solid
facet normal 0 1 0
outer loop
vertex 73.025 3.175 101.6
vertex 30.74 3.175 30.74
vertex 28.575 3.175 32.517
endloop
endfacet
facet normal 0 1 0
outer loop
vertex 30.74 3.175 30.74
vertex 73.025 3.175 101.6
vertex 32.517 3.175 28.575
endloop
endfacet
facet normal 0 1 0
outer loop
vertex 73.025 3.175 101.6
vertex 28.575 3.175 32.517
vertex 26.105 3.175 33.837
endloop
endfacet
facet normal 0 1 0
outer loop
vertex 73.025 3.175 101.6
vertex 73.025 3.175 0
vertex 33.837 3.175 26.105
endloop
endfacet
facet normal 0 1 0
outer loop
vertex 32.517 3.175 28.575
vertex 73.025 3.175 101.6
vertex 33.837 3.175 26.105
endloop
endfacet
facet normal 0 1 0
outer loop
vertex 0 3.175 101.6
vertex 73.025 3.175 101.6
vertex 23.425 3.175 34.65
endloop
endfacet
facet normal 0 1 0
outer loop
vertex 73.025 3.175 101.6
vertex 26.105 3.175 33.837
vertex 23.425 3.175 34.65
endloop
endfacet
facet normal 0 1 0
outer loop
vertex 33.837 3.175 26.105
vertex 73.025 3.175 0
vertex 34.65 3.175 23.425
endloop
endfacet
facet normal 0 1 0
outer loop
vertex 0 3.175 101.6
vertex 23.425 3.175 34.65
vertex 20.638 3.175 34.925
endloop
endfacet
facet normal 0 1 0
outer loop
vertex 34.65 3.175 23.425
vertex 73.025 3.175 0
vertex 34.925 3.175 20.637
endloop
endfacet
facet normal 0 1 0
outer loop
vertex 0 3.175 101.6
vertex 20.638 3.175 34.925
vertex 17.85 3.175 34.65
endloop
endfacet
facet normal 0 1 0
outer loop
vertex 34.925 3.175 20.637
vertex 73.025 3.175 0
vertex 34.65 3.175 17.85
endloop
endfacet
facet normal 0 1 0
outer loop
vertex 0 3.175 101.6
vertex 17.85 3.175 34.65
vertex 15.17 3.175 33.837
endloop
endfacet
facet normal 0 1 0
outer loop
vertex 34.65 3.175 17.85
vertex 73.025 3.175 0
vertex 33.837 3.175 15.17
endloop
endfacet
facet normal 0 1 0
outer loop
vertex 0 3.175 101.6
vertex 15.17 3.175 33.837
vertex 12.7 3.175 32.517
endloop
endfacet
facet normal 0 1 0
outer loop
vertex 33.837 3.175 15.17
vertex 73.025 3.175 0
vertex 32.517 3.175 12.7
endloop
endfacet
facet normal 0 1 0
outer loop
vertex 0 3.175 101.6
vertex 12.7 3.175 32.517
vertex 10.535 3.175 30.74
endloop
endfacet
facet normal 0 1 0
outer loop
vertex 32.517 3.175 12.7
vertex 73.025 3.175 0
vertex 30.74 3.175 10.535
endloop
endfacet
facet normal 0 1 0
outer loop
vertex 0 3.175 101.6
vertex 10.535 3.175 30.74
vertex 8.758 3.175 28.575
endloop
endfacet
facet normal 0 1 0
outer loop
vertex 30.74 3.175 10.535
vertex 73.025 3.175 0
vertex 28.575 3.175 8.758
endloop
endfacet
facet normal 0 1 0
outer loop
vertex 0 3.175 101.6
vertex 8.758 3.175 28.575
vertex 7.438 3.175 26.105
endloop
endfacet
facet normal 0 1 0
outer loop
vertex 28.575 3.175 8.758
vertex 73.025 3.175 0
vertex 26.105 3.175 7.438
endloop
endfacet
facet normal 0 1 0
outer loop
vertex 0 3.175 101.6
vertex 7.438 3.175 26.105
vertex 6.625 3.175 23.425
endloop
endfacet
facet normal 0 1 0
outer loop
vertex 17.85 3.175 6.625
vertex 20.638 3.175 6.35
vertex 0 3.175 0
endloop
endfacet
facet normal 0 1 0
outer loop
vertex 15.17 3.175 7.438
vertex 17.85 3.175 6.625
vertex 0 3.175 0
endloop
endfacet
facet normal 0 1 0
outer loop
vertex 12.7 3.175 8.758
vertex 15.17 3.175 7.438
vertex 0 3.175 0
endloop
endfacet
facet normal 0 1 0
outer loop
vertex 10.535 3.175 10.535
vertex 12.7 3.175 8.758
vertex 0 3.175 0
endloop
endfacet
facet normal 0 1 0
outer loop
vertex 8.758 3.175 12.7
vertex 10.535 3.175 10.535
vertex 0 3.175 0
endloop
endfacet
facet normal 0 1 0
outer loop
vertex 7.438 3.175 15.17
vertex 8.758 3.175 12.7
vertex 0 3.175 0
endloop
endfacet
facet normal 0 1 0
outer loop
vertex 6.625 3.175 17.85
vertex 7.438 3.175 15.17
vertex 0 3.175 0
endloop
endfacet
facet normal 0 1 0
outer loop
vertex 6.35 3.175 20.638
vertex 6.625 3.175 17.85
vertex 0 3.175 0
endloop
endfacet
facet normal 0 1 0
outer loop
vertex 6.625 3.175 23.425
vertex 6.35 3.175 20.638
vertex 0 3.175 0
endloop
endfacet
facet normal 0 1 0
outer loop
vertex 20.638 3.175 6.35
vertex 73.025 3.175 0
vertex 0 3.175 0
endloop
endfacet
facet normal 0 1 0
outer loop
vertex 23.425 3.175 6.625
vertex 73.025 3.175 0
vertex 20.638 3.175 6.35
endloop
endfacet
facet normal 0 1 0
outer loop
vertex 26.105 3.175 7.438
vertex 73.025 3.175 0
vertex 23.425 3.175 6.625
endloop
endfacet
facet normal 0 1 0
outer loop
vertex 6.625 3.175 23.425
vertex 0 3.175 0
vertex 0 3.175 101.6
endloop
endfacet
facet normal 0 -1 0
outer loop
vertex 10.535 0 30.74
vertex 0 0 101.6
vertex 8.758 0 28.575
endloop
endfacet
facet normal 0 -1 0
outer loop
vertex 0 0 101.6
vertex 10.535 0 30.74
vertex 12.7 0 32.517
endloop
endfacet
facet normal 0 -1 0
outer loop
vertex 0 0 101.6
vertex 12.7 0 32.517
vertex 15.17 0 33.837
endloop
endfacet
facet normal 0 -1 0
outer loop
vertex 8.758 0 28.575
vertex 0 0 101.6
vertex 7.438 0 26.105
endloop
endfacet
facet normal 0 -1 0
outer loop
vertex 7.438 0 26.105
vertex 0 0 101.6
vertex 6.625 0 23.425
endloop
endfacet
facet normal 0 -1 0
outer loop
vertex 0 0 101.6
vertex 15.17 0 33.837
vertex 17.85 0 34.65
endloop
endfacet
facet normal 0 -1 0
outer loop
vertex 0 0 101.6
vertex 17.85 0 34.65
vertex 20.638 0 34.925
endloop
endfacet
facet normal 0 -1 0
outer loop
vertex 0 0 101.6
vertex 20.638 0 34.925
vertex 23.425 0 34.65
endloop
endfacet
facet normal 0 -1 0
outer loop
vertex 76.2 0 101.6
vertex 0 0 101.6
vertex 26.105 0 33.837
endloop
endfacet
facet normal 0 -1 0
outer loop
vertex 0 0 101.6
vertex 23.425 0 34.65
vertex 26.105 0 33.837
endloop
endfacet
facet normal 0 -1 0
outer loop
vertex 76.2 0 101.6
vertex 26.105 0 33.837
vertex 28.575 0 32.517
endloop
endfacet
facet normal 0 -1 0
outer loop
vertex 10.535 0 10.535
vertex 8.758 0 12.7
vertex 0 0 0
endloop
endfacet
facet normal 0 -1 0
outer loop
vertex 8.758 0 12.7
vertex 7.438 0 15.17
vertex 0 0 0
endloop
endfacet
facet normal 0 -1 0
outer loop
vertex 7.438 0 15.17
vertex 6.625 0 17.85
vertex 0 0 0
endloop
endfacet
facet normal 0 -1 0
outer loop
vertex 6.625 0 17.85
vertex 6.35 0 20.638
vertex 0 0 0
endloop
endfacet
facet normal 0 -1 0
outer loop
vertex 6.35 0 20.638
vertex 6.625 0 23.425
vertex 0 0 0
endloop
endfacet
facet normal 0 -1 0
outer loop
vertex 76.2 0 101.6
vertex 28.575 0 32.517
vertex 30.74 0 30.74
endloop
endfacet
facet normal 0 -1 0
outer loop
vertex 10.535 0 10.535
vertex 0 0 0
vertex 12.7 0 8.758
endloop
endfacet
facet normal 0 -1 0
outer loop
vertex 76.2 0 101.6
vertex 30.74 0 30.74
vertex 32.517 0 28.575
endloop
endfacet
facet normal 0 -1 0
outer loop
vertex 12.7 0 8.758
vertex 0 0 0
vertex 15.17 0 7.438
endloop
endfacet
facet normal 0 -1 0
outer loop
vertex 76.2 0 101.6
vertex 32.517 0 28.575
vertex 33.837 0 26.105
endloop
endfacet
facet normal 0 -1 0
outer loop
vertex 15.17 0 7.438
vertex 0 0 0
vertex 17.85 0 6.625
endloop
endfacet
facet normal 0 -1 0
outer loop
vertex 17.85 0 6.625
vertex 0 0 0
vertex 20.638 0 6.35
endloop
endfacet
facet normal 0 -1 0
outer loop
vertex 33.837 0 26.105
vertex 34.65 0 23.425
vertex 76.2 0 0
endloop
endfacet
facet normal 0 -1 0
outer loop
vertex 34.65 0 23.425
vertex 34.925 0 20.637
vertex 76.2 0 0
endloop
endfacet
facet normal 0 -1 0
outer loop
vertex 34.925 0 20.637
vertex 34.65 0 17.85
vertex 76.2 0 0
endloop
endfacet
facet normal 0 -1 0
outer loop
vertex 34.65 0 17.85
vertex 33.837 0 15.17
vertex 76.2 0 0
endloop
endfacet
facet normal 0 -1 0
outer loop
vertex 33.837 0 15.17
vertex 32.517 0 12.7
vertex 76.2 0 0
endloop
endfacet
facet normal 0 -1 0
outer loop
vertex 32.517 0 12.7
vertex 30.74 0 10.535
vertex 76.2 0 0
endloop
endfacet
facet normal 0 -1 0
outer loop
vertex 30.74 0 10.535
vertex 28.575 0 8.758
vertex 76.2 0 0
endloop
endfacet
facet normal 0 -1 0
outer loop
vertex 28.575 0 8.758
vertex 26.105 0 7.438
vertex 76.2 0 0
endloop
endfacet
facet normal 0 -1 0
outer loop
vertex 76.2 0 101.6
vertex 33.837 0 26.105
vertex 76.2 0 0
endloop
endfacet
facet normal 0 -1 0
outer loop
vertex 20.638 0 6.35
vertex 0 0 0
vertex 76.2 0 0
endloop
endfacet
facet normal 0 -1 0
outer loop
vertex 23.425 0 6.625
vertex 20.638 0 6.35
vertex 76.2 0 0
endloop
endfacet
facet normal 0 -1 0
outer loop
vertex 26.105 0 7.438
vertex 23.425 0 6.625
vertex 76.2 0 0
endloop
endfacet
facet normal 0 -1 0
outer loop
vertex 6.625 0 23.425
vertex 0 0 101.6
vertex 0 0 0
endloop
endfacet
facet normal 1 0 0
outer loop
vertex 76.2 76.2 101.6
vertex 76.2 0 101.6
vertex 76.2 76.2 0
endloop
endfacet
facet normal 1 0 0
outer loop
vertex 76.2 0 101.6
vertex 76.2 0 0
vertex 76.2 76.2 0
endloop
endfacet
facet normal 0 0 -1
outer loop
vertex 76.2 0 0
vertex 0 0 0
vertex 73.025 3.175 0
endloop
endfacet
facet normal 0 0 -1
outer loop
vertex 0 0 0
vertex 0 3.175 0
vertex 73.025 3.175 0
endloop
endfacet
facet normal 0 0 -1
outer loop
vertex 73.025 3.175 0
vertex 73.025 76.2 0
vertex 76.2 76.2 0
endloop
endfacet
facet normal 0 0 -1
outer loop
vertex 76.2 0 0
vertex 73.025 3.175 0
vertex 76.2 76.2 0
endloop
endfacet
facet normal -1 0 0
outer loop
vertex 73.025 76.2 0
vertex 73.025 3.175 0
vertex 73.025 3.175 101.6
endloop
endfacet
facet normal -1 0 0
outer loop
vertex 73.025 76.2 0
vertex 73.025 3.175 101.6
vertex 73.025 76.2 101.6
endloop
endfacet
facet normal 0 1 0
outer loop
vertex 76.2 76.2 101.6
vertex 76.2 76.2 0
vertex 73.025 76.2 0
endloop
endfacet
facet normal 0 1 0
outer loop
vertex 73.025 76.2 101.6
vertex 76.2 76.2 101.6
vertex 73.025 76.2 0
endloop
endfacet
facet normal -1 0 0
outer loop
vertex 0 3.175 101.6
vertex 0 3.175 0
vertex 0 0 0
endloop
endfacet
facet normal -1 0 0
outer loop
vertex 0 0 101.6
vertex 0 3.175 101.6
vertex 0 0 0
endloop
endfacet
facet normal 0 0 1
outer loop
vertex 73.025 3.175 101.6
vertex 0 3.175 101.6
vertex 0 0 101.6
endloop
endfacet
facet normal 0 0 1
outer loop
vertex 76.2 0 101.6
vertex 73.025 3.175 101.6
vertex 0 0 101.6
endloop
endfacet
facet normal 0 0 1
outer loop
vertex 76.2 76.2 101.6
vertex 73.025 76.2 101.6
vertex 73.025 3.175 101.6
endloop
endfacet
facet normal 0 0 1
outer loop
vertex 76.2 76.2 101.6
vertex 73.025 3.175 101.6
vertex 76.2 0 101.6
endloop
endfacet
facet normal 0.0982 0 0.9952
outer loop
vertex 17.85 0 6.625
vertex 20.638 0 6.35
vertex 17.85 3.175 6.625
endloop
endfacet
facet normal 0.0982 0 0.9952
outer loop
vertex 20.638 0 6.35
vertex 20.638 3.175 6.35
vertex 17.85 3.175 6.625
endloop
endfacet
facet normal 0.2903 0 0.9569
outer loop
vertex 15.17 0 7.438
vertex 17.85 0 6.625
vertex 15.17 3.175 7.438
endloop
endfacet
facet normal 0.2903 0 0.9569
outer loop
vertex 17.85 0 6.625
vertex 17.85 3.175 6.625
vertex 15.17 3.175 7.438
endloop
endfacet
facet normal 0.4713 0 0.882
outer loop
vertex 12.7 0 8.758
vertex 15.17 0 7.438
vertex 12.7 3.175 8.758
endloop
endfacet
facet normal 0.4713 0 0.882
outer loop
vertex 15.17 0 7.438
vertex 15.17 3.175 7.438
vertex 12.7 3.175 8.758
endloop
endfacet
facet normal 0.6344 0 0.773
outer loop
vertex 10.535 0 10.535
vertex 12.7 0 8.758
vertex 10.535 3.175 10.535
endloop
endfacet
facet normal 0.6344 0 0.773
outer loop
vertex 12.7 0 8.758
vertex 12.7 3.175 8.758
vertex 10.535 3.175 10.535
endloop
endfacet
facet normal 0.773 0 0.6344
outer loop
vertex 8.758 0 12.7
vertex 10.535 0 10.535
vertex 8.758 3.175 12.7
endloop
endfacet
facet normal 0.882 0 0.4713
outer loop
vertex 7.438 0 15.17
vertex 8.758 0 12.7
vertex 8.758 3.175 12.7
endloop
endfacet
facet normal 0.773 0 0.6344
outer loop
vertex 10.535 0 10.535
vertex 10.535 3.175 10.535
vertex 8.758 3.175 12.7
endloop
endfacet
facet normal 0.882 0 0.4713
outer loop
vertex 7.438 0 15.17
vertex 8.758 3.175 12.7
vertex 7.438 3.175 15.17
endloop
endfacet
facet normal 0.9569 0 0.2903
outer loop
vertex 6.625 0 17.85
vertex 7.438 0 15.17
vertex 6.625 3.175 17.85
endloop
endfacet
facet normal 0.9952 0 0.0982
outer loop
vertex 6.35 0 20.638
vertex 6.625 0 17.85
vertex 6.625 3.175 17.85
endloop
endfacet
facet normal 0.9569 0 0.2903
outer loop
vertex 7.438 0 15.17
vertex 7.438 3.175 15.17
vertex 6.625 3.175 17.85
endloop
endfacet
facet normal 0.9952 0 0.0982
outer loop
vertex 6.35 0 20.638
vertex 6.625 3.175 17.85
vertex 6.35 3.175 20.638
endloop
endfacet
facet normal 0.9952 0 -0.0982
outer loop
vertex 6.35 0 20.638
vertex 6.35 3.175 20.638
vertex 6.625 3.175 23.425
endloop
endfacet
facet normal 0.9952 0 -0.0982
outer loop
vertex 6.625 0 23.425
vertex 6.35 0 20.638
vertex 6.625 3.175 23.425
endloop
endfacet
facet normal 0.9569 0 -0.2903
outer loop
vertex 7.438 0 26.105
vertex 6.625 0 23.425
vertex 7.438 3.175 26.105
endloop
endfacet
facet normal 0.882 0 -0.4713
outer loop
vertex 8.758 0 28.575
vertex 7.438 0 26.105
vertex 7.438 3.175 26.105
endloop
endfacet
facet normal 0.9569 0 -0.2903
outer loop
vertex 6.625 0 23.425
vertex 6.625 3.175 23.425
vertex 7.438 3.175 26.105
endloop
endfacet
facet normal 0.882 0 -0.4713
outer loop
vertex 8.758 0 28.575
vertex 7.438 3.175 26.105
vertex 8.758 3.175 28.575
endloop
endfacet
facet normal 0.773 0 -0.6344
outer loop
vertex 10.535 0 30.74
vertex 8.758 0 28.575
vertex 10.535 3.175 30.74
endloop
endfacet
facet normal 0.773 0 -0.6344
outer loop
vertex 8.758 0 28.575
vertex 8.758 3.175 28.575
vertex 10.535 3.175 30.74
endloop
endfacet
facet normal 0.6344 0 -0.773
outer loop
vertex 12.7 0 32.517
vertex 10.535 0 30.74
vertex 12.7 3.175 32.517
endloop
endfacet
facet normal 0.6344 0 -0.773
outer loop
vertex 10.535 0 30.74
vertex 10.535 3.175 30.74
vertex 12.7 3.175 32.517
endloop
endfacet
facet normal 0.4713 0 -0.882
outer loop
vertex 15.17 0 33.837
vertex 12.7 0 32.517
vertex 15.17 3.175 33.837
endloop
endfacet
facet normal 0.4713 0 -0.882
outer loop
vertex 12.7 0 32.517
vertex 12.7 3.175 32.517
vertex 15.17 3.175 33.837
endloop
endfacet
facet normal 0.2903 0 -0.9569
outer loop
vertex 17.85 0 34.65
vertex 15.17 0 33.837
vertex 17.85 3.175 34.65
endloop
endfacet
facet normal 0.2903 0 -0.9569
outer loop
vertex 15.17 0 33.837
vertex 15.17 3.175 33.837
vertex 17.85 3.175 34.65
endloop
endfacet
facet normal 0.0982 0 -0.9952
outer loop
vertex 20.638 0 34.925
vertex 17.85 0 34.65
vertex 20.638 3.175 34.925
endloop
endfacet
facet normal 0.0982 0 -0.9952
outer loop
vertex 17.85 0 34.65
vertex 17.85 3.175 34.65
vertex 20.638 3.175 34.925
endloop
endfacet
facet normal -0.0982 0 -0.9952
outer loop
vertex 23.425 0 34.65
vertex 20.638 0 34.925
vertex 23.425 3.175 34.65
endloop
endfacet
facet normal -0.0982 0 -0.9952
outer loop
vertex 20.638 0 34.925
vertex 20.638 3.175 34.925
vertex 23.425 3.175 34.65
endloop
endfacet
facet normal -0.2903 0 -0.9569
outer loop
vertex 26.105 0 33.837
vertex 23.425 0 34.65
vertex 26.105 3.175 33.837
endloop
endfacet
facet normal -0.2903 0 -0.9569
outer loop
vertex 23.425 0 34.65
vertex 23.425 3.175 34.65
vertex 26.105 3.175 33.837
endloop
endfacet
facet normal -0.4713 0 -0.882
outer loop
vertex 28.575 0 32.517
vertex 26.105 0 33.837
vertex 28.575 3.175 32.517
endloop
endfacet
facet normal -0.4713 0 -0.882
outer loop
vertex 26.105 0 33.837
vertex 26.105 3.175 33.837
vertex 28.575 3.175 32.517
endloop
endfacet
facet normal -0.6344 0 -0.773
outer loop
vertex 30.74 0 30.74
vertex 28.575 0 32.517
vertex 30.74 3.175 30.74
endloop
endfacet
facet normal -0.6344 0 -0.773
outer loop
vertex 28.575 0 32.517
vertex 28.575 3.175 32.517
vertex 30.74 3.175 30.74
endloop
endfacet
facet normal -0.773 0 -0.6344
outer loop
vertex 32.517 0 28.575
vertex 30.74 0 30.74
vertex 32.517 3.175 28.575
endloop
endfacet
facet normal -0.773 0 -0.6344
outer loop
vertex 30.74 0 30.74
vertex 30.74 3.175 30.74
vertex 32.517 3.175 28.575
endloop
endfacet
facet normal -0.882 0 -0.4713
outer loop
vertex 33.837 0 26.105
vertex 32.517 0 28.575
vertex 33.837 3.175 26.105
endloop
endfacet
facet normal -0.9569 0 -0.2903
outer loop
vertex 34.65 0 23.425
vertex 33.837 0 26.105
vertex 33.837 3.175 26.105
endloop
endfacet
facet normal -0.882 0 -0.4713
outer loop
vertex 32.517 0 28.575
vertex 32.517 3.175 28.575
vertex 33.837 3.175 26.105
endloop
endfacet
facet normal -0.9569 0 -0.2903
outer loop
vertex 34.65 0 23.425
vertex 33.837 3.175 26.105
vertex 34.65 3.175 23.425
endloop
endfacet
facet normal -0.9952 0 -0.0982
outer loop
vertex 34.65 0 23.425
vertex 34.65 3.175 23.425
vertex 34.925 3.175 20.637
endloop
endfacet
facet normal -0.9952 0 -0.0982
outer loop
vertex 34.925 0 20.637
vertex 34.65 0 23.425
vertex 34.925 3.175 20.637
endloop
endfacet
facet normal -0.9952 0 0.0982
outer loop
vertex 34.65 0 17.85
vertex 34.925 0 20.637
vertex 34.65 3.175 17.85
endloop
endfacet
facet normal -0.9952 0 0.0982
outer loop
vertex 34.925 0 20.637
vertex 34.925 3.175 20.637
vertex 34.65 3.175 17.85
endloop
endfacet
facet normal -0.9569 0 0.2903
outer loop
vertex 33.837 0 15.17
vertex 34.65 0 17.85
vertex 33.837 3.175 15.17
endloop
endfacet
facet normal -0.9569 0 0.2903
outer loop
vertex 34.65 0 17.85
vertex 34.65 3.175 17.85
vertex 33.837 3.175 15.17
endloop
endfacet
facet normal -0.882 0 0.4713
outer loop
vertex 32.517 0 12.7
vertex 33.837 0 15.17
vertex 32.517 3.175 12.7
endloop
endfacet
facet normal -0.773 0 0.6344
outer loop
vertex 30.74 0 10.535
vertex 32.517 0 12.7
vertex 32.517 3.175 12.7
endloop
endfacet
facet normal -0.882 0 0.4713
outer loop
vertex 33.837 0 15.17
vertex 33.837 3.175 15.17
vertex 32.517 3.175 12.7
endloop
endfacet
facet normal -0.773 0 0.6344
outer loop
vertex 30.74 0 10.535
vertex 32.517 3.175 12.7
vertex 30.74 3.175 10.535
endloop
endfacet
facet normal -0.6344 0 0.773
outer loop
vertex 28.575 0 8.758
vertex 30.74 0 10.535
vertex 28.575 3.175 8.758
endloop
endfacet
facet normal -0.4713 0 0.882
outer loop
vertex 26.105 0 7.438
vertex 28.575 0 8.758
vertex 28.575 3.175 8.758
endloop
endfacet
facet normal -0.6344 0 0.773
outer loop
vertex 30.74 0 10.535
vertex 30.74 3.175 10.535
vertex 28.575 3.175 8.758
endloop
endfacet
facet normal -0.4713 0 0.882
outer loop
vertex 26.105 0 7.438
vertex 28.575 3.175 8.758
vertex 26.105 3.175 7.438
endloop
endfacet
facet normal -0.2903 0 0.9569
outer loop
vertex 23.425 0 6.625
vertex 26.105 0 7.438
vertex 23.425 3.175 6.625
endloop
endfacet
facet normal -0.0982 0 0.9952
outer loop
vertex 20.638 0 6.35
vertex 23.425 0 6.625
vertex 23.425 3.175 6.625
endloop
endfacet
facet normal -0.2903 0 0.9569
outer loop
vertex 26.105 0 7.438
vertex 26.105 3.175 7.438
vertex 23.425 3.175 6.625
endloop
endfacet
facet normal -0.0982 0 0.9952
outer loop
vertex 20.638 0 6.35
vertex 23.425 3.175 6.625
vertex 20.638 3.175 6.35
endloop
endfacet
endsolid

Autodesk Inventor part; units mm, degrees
ref_plane "YZ Plane" through (0, 0, 0) normal (1, 0, 0) x (0, 1, 0)
ref_plane "XZ Plane" through (0, 0, 0) normal (0, 1, 0) x (-1, 0, 0)
ref_plane "XY Plane" through (0, 0, 0) normal (0, 0, 1) x (1, 0, 0)
sketch "Sketch1" plane through (0, 0, 0) normal (0, 0, 1) x (1, 0, 0)
  line L0 (0, 0) -> (76.2, 0)
  line L1 (76.2, 0) -> (76.2, 76.2)
  line L2 (76.2, 76.2) -> (0, 76.2)
  line L3 (0, 3.175) -> (0, 0)
  line L4 (3.175, 3.175) -> (73.025, 3.175)
  line L5 (73.025, 3.175) -> (73.025, 73.025)
  line L6 (3.175, 3.175) -> (0, 3.175)
  line L7 (73.025, 73.025) -> (73.025, 76.2)
  dimension "d0" = 76.2
  dimension "d1" = 76.2
extrude "Extrusion1" add sketch "Sketch1" along normal blind 101.6
sketch "Sketch2" plane through (0, 0, 0) normal (0, -1, 0) x (1, 0, 0)
  line L0 (0, 101.6) -> (76.2, 101.6) projected
  line L1 (0, 0) -> (0, 101.6) projected
  point P0 (20.6375, 20.6375)
  dimension "d5" = 80.9625
  dimension "d6" = 20.6375
  dimension "d14" = 101.6
hole "Hole1" at (20.6375, 0, 20.6375) direction (0, 1, 0) diameter 28.575 depth 25.4 tip angle 118
properties part number "ARM_068_NewLongShaftMountFlipped" material "Aluminum 6061"
